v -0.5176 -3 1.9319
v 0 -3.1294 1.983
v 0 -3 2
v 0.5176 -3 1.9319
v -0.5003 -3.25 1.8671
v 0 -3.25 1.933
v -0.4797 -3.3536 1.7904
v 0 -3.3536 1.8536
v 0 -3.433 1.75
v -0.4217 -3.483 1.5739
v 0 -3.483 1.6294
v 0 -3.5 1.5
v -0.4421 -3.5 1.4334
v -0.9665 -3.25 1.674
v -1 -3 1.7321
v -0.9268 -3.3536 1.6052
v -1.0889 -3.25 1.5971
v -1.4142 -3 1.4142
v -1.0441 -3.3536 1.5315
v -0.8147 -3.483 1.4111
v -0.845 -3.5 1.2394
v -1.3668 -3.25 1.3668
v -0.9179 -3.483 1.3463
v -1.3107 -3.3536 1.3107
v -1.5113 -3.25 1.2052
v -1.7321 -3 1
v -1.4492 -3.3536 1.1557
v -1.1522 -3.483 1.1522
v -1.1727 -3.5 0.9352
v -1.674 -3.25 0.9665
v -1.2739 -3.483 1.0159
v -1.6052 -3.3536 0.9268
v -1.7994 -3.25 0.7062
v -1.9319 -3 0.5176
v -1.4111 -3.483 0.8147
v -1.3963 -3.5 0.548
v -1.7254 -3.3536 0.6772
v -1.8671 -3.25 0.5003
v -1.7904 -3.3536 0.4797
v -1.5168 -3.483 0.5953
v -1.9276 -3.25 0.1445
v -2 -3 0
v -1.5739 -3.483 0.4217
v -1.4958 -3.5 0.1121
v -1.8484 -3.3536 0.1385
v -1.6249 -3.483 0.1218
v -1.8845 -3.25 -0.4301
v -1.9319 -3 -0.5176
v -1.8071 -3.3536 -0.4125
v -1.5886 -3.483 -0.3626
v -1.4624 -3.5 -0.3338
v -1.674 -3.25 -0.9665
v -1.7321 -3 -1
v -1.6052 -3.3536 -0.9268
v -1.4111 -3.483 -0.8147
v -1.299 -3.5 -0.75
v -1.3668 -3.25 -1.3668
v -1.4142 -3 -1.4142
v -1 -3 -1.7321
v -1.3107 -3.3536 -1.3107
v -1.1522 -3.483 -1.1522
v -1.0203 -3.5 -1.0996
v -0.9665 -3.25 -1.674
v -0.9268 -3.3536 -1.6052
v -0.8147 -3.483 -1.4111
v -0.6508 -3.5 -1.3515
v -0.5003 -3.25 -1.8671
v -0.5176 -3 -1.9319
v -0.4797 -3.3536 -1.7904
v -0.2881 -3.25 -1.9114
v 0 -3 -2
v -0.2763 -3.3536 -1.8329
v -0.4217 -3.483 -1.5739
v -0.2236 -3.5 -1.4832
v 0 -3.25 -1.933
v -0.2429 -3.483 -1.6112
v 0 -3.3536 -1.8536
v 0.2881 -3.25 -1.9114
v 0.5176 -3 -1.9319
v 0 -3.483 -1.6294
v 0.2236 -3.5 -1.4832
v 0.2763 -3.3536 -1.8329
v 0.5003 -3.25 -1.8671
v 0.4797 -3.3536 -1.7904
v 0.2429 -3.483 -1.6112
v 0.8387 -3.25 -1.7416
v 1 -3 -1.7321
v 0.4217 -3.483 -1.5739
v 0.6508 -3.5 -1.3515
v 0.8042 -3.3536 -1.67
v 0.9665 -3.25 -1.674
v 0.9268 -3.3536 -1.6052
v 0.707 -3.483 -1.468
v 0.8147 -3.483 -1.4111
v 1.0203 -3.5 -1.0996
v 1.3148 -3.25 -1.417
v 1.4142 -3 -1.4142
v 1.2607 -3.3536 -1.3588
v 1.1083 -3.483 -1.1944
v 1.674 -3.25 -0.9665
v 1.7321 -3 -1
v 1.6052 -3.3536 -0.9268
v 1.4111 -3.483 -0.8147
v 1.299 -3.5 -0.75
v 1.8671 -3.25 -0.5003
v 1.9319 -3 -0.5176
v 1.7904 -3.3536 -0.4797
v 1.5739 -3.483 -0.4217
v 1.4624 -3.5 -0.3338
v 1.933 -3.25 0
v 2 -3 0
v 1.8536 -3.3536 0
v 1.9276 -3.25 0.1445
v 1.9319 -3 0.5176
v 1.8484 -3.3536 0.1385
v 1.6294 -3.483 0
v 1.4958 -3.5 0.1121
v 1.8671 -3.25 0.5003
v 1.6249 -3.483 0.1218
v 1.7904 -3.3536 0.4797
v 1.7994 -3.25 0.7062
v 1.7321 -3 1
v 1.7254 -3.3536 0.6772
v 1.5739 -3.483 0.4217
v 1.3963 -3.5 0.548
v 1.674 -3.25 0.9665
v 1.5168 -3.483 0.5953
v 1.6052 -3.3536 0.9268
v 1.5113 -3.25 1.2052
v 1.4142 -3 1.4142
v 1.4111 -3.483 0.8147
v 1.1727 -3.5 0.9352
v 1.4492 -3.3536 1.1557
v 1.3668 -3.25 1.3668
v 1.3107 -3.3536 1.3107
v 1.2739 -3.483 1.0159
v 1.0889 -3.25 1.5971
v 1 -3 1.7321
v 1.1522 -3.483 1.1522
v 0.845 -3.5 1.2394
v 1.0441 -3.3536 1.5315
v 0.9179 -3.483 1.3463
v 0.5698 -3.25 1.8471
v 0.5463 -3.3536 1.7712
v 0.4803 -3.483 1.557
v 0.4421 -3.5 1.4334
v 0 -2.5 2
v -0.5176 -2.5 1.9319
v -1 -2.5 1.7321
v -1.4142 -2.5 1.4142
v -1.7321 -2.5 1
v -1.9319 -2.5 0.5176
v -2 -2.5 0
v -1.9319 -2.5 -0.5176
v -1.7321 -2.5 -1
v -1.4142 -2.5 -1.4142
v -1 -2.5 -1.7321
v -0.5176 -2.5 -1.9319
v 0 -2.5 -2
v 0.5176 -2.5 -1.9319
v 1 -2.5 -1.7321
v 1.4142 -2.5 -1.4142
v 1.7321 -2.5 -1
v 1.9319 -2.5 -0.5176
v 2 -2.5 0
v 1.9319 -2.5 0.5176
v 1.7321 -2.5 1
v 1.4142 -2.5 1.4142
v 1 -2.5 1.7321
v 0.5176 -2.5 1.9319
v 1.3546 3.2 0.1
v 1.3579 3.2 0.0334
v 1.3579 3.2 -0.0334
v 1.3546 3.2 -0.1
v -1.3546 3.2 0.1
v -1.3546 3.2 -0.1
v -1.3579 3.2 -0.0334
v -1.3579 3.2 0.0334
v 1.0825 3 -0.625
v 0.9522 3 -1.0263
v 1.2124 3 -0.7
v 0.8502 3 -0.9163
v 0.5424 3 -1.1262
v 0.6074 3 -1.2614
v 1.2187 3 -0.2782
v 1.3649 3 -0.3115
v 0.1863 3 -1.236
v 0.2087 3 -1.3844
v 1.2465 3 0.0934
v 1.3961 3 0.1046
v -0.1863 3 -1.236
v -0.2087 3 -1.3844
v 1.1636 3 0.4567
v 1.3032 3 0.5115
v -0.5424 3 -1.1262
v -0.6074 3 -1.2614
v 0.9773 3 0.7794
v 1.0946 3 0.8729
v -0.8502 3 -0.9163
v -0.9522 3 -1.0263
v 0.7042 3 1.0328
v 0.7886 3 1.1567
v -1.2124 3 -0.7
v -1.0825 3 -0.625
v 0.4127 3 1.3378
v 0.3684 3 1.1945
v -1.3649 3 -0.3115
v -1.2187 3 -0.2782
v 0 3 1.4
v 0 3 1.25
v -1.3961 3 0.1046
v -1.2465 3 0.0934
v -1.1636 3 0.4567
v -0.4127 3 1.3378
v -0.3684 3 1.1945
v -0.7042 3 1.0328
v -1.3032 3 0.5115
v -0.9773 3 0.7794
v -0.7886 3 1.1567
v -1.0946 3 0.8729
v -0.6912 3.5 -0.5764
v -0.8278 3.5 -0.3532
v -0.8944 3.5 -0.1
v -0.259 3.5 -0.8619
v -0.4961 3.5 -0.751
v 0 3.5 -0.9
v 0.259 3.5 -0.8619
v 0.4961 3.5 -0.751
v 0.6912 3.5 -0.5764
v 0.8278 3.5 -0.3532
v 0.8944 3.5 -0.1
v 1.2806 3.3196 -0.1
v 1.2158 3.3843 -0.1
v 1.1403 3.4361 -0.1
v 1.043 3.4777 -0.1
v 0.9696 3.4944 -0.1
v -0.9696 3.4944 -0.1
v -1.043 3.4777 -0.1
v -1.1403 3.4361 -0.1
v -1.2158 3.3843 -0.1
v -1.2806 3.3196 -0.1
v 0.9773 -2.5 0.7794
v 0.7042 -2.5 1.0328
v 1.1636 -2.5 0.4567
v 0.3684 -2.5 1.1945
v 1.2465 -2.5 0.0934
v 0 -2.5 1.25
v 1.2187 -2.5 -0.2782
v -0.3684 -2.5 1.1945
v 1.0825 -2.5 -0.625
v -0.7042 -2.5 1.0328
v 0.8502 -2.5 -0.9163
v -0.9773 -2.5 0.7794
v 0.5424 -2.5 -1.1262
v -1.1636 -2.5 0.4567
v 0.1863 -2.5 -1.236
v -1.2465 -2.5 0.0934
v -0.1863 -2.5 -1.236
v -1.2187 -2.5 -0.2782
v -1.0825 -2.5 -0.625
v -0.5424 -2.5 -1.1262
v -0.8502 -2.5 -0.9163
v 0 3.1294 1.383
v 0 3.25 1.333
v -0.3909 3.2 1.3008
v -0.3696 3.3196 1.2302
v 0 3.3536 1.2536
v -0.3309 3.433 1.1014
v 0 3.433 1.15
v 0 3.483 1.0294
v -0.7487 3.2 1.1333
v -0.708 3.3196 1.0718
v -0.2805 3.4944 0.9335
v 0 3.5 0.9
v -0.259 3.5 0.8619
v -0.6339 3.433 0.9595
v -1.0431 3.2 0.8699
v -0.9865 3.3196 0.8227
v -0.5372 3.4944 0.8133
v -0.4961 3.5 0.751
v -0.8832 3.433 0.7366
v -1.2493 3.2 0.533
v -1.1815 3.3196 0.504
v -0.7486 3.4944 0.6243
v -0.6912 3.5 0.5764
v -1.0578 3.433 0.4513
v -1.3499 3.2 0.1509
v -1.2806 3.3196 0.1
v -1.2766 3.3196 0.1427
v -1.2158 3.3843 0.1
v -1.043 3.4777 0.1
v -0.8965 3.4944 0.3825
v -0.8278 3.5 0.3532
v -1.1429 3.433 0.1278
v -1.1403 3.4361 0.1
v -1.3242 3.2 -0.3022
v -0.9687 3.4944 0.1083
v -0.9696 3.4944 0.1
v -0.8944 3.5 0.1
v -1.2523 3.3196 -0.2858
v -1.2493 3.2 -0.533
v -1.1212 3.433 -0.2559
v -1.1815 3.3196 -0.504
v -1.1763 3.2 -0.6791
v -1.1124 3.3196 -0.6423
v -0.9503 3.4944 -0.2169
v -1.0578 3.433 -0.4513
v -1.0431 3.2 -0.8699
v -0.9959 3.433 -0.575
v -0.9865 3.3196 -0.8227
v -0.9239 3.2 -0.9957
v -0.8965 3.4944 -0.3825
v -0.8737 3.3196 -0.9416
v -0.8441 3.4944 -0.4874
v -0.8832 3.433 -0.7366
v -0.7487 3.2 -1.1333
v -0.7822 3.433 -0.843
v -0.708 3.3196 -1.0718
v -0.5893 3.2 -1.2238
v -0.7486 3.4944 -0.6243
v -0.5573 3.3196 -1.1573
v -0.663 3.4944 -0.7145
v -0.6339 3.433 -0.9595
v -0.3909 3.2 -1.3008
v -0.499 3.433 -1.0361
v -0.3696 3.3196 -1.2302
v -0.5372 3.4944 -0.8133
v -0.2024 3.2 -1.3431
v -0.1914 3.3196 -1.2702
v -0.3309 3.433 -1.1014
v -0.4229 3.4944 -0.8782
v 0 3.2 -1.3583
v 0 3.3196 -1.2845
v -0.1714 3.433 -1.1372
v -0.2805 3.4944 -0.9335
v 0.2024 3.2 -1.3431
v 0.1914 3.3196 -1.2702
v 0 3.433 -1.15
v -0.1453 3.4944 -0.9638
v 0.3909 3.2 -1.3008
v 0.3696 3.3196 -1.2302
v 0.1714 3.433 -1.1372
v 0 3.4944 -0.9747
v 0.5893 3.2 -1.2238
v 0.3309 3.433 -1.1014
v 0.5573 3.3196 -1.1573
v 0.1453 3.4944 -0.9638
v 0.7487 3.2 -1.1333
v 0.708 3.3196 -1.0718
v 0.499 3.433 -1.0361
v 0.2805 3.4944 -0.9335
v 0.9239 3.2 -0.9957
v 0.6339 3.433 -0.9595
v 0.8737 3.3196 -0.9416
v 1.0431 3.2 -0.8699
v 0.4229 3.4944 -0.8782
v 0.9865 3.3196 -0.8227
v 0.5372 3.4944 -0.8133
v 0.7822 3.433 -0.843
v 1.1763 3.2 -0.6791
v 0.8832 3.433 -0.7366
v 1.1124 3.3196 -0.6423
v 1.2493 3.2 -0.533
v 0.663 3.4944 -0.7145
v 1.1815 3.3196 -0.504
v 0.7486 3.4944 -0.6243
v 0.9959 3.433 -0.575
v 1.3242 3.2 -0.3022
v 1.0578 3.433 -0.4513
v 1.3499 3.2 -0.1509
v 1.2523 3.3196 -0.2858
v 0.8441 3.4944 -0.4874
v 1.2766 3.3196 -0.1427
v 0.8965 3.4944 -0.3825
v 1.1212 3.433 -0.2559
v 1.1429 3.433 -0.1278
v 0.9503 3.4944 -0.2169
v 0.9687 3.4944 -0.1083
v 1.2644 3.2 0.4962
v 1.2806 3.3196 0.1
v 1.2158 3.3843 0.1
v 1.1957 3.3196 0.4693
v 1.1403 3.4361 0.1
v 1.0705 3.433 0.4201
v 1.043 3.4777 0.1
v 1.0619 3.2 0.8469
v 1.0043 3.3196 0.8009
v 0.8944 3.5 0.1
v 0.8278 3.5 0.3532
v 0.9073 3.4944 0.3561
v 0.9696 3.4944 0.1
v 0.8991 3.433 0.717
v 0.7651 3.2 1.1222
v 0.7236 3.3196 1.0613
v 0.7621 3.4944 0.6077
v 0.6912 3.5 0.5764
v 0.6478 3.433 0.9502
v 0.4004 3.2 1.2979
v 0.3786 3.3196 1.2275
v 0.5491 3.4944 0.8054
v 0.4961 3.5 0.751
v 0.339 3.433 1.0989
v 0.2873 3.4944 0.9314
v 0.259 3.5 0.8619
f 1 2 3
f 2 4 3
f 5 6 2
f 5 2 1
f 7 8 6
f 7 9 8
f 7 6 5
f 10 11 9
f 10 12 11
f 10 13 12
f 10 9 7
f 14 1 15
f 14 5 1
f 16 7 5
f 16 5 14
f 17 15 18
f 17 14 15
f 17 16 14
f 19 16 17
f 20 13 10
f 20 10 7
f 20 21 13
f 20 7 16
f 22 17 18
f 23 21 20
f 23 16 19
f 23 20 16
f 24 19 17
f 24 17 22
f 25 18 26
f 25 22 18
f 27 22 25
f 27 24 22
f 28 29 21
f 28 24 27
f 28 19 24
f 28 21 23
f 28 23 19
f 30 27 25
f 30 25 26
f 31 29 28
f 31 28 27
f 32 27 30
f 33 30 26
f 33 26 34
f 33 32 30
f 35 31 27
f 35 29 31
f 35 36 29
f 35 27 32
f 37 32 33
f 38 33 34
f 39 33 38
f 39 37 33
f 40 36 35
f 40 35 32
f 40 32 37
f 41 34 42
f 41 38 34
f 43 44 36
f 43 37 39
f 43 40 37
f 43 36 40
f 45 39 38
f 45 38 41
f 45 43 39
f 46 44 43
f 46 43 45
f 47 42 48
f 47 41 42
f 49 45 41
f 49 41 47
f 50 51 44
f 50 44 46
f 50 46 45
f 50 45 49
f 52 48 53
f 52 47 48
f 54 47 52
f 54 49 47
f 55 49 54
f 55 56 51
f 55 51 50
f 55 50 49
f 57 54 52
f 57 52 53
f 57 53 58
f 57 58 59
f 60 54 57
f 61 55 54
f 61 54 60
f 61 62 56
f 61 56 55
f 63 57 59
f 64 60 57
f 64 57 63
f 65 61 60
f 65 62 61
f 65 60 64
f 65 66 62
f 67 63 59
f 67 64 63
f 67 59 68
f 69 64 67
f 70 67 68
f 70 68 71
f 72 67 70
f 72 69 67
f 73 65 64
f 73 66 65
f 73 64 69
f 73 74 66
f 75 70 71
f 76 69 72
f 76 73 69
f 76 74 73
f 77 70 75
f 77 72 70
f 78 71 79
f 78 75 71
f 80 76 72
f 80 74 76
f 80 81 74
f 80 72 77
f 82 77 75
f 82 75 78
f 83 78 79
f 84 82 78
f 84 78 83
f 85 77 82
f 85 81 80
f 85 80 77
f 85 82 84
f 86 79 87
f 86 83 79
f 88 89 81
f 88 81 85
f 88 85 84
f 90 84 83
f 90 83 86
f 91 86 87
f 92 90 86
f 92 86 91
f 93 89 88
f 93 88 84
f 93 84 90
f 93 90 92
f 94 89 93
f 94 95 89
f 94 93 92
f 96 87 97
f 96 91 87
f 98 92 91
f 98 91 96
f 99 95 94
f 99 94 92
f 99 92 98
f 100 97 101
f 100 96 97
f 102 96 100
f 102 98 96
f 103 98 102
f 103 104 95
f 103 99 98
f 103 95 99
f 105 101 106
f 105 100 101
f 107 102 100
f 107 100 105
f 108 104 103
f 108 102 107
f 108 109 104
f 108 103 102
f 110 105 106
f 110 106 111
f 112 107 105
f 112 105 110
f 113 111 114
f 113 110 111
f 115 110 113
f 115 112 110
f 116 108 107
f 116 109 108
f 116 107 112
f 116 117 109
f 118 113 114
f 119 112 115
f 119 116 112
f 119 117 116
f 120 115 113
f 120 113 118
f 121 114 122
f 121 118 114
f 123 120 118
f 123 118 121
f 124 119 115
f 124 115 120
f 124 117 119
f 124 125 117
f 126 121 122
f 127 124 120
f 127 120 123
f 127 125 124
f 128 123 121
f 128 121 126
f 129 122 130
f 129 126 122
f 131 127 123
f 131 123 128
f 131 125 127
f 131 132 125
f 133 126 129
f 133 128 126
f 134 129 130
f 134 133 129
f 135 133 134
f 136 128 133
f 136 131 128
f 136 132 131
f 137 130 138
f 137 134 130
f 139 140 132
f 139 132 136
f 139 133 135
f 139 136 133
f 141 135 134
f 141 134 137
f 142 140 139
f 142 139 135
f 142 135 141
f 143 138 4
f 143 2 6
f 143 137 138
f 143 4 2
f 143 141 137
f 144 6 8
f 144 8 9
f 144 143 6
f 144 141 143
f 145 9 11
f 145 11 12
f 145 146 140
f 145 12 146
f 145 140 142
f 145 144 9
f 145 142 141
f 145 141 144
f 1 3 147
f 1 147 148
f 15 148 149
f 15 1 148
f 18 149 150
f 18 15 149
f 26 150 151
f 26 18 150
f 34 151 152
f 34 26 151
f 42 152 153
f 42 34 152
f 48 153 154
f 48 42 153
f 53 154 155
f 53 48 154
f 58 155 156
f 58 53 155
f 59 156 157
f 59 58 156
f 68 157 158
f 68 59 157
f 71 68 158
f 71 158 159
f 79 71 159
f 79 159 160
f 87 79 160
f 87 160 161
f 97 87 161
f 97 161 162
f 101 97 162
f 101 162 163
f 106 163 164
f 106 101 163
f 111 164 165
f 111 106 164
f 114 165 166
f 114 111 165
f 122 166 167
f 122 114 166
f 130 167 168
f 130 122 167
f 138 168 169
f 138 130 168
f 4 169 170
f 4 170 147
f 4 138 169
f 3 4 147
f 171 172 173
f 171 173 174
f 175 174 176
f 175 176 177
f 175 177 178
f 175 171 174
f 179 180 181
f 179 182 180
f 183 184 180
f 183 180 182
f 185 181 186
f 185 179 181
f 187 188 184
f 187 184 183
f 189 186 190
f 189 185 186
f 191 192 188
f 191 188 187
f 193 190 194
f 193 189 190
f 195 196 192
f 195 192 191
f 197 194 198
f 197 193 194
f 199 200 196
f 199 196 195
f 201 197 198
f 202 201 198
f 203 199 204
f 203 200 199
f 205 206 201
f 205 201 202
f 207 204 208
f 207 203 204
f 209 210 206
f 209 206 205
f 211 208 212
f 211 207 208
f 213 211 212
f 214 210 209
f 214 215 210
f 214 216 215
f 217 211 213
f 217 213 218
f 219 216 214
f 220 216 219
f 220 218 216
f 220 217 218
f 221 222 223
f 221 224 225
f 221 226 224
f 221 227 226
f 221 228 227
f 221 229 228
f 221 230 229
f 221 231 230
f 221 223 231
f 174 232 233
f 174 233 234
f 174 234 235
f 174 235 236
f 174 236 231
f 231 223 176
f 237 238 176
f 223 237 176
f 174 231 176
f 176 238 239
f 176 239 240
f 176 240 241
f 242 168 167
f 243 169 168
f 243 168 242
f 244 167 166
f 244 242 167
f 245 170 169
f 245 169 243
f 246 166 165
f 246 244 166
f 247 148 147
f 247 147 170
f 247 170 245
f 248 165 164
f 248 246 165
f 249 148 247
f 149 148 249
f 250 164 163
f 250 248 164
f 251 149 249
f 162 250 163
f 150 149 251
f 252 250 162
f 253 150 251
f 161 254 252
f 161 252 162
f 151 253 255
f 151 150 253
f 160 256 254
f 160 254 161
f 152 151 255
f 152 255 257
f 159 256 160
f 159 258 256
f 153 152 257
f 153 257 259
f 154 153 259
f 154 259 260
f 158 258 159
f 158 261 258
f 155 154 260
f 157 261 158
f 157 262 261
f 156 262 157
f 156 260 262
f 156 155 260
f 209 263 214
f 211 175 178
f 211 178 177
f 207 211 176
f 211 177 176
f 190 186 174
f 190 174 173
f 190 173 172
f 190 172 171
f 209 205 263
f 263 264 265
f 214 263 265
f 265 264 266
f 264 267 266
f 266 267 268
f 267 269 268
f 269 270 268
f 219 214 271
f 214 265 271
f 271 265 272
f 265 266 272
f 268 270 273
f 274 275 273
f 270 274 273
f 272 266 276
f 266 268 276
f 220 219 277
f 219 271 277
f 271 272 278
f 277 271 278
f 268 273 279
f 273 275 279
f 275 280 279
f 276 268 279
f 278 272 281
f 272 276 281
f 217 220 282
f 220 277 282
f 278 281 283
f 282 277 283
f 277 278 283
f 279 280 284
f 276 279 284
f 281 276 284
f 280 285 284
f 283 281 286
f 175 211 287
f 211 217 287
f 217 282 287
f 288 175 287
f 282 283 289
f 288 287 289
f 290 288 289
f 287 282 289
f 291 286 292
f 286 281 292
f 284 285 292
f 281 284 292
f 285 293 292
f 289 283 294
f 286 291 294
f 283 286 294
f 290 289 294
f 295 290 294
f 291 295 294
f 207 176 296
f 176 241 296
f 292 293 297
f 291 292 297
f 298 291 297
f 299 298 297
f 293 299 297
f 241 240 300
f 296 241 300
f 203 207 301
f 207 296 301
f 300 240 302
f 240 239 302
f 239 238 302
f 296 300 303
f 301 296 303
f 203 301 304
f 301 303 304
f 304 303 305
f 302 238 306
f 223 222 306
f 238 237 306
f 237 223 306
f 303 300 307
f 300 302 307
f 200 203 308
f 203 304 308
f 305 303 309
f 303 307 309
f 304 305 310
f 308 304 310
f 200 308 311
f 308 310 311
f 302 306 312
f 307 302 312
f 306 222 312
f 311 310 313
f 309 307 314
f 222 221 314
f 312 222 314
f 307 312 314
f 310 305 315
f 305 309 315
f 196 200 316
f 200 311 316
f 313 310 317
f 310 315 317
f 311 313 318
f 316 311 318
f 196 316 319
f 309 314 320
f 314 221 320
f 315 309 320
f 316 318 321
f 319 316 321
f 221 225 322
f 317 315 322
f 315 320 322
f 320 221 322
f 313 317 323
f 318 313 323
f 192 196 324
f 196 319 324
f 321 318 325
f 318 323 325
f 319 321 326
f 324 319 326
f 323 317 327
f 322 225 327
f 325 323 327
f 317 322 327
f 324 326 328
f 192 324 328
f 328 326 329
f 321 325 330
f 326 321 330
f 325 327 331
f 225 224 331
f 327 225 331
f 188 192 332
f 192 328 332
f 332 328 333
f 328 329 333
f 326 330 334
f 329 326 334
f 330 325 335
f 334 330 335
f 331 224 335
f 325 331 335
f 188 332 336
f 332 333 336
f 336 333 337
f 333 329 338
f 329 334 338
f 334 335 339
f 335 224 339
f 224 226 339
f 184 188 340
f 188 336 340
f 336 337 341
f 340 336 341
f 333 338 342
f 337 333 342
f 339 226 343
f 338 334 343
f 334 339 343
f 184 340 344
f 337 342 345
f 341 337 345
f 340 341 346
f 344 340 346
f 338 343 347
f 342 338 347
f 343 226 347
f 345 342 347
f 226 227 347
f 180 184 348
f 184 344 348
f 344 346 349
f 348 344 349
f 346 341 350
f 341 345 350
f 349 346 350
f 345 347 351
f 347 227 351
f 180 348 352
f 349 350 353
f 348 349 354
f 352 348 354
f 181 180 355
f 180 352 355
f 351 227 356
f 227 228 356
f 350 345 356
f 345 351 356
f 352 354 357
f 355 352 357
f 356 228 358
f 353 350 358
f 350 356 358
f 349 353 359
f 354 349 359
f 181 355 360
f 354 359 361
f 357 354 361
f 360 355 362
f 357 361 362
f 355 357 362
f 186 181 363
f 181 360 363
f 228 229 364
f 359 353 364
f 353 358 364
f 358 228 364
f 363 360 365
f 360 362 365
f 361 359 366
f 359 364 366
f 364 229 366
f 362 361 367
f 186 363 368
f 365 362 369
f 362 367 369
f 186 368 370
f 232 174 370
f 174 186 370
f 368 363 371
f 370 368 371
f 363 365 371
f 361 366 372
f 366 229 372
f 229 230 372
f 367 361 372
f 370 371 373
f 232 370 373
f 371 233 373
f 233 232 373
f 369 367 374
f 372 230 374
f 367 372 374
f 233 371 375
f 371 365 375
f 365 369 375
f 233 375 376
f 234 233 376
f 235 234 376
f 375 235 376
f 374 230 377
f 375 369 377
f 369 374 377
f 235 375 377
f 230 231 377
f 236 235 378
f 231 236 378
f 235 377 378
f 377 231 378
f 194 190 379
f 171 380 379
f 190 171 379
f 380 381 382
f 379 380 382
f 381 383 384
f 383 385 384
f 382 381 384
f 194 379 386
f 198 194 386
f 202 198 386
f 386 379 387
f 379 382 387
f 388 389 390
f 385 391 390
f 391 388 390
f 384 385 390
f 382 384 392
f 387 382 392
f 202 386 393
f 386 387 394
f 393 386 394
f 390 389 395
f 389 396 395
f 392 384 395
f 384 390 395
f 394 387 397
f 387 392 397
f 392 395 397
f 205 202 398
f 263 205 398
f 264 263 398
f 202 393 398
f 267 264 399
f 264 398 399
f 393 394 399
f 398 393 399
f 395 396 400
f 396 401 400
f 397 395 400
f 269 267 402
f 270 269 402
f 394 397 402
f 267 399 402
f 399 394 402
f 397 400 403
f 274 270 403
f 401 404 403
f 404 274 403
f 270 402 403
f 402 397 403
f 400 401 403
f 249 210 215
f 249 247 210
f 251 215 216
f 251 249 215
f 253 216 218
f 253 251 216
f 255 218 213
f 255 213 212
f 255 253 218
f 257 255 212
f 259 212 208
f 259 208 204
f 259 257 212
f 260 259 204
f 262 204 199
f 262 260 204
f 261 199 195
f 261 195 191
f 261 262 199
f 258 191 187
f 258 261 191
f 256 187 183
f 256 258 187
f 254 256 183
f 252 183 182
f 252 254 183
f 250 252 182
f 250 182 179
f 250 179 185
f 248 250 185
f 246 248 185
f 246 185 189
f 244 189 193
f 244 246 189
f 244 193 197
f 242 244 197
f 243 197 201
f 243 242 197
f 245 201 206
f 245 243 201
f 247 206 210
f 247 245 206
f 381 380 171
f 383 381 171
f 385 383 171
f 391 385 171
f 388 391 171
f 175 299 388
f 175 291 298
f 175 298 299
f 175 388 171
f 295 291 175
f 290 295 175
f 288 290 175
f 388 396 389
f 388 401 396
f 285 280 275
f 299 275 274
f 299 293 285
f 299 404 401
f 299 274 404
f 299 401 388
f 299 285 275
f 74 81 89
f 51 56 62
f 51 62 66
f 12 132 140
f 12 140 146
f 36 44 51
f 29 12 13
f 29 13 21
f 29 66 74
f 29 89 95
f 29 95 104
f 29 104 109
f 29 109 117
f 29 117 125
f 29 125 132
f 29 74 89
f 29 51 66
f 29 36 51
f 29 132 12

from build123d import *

# Parameters (mm, degrees)
F2_R     = 0.5
F3_R     = 0.49999
F4_W     = 3
F4_H     = 0.1
F5_DEPTH = 0.3


# Not quite as in the source:
# - a fillet or chamfer is up to 0.001 mm smaller than in the source, because OpenCascade refuses the exact size


with BuildPart() as f1:
    # F0 (on Right) → F1 (revolve)
    with BuildSketch(Plane.YZ):
        Polygon((-3.5, 0), (-2.5, 0), (3, 0), (3.5, 0), (3.5, 1.4), (3, 1.4), (3, 1.25), (-2.5, 1.25), (-2.5, 2), (-3.5, 2), align=None)
    revolve(axis=Axis((0, 0.25, 0), (0, -1, 0)))

    # F2
    f2_edges = [f1.edges().sort_by_distance(p)[0] for p in [
        (0, -3.5, -2),
    ]]
    fillet(f2_edges, radius=F2_R)

    # F3 (radius 0.5 in the source; OpenCascade refuses exactly that, so slightly less here)
    f3_edges = [f1.edges().sort_by_distance(p)[0] for p in [
        (0, 3.5, -1.4),
    ]]
    fillet(f3_edges, radius=F3_R)

    # F4 (on face) → F5 (cut)
    with BuildSketch(Plane(origin=(0, 3.5, 0), x_dir=(-1, 0, 0), z_dir=(0, 1, 0))):
        with Locations((0, 0.05)):
            Rectangle(F4_W, F4_H)
        with Locations((0, -0.05)):
            Rectangle(F4_W, F4_H)
    extrude(amount=-F5_DEPTH, mode=Mode.SUBTRACT)


solid = f1.part
